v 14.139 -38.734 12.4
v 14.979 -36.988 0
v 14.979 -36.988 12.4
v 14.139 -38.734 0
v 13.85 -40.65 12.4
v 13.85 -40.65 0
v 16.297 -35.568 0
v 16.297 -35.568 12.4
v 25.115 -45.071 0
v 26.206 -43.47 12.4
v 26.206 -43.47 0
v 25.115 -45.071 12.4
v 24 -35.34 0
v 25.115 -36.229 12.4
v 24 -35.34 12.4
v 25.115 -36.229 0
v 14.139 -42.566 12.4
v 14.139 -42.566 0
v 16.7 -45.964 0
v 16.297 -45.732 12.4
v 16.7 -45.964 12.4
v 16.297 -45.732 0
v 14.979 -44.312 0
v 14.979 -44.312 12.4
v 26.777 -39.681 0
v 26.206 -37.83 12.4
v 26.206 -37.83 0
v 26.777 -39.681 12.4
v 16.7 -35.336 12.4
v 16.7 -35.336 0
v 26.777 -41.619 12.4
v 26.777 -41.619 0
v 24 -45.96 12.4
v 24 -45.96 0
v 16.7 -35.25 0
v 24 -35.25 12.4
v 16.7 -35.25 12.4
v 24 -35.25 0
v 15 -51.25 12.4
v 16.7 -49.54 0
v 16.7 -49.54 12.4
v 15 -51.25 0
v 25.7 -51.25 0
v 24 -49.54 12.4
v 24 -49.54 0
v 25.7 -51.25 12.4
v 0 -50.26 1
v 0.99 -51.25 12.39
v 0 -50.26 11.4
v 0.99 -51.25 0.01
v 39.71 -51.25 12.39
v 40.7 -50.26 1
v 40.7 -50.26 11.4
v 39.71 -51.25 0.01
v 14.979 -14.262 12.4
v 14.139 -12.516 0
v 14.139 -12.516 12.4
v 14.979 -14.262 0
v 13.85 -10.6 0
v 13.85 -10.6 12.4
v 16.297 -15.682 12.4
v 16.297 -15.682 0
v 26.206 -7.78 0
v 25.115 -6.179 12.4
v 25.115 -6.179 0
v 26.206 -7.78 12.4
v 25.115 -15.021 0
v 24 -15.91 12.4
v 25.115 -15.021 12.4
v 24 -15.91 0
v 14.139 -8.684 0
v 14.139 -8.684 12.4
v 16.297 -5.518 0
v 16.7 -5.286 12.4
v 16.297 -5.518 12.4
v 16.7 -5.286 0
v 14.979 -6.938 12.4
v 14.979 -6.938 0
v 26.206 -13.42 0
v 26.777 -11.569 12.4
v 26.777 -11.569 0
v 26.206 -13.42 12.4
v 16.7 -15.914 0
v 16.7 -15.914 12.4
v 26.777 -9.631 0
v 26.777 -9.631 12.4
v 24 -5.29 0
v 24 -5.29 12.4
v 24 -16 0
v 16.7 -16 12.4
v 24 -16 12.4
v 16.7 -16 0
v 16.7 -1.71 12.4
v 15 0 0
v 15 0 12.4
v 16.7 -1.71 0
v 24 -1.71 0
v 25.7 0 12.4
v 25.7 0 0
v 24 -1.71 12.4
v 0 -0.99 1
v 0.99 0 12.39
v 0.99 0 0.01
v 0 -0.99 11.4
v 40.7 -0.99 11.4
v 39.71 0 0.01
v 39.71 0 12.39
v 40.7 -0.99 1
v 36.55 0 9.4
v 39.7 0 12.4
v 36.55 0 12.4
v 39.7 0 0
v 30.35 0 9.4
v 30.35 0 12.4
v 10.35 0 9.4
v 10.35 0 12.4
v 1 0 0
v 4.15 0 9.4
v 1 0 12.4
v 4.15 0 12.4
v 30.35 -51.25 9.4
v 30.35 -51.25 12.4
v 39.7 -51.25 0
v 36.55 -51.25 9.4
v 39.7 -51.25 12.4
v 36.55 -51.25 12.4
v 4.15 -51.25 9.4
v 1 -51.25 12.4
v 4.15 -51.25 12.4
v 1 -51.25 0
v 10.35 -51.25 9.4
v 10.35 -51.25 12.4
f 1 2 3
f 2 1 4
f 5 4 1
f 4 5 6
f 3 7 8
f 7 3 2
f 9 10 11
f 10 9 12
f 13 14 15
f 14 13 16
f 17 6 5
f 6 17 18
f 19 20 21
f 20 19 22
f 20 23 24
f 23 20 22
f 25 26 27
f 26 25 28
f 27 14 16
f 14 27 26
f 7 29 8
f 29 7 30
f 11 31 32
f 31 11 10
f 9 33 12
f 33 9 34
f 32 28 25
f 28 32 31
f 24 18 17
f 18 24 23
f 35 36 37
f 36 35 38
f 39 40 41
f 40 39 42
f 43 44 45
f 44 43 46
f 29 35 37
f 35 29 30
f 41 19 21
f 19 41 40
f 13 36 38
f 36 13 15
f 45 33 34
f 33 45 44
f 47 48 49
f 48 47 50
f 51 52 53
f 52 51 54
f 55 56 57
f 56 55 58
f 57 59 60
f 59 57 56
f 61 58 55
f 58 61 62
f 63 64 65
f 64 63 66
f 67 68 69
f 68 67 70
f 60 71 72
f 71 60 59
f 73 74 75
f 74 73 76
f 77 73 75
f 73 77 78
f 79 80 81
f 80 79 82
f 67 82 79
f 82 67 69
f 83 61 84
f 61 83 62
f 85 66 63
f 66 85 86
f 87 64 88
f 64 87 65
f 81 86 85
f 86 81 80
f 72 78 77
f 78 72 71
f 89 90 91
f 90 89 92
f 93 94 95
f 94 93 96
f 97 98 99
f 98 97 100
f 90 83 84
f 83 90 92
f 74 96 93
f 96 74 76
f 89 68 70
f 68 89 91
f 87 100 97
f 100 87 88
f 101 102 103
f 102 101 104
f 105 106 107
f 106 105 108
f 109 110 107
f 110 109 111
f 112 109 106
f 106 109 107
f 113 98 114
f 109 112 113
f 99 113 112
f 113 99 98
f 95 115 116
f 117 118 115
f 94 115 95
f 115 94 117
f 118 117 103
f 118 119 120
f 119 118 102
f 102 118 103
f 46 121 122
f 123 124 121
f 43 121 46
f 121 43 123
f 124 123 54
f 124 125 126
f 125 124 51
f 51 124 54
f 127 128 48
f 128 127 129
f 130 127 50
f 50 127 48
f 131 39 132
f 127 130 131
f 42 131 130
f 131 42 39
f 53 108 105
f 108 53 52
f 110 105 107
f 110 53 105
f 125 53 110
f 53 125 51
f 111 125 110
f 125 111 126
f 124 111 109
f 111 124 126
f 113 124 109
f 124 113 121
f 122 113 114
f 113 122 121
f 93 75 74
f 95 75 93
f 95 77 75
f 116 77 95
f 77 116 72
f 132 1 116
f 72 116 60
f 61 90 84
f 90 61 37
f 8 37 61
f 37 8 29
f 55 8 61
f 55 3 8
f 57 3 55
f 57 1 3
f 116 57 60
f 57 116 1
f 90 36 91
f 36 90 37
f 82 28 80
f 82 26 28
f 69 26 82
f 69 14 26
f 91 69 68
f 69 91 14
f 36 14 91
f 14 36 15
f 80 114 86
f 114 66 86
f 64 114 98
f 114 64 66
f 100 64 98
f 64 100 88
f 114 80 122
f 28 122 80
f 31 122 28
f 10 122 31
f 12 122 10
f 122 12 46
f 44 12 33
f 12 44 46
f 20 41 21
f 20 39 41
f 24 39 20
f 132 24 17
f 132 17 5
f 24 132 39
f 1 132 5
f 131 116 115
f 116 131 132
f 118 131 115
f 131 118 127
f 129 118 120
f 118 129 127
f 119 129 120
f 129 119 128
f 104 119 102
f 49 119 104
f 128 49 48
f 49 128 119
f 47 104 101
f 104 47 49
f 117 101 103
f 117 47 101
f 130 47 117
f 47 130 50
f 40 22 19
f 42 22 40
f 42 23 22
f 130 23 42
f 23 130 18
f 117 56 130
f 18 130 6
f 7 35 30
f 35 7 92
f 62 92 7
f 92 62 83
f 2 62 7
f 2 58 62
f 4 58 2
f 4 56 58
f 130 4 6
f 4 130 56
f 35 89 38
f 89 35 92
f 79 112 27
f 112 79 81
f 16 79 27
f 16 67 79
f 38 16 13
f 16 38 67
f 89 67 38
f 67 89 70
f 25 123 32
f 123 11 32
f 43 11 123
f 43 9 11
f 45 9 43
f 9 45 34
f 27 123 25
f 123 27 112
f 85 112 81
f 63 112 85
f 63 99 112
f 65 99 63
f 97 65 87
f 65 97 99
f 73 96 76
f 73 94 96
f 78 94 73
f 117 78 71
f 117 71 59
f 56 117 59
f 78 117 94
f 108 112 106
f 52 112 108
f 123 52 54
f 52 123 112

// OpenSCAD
include <lib/brio.scad>

//brio_straight(LENGTH);
//brio_straight((3/4)*LENGTH);
//brio_straight((1/2)*LENGTH);
brio_straight((1/4)*LENGTH);
//brio_curved(ROUND_R, 8); // inner radius, Nth part
//brio_curved(ROUND_R, 16); // inner radius, Nth part
//brio_bridge();
//brio_cross(LENGTH/2);
//brio_splitter();
//brio_splitter_round();
//brio_support();
//brio_tunnel();
//brio_connector(CONN_LEN);
